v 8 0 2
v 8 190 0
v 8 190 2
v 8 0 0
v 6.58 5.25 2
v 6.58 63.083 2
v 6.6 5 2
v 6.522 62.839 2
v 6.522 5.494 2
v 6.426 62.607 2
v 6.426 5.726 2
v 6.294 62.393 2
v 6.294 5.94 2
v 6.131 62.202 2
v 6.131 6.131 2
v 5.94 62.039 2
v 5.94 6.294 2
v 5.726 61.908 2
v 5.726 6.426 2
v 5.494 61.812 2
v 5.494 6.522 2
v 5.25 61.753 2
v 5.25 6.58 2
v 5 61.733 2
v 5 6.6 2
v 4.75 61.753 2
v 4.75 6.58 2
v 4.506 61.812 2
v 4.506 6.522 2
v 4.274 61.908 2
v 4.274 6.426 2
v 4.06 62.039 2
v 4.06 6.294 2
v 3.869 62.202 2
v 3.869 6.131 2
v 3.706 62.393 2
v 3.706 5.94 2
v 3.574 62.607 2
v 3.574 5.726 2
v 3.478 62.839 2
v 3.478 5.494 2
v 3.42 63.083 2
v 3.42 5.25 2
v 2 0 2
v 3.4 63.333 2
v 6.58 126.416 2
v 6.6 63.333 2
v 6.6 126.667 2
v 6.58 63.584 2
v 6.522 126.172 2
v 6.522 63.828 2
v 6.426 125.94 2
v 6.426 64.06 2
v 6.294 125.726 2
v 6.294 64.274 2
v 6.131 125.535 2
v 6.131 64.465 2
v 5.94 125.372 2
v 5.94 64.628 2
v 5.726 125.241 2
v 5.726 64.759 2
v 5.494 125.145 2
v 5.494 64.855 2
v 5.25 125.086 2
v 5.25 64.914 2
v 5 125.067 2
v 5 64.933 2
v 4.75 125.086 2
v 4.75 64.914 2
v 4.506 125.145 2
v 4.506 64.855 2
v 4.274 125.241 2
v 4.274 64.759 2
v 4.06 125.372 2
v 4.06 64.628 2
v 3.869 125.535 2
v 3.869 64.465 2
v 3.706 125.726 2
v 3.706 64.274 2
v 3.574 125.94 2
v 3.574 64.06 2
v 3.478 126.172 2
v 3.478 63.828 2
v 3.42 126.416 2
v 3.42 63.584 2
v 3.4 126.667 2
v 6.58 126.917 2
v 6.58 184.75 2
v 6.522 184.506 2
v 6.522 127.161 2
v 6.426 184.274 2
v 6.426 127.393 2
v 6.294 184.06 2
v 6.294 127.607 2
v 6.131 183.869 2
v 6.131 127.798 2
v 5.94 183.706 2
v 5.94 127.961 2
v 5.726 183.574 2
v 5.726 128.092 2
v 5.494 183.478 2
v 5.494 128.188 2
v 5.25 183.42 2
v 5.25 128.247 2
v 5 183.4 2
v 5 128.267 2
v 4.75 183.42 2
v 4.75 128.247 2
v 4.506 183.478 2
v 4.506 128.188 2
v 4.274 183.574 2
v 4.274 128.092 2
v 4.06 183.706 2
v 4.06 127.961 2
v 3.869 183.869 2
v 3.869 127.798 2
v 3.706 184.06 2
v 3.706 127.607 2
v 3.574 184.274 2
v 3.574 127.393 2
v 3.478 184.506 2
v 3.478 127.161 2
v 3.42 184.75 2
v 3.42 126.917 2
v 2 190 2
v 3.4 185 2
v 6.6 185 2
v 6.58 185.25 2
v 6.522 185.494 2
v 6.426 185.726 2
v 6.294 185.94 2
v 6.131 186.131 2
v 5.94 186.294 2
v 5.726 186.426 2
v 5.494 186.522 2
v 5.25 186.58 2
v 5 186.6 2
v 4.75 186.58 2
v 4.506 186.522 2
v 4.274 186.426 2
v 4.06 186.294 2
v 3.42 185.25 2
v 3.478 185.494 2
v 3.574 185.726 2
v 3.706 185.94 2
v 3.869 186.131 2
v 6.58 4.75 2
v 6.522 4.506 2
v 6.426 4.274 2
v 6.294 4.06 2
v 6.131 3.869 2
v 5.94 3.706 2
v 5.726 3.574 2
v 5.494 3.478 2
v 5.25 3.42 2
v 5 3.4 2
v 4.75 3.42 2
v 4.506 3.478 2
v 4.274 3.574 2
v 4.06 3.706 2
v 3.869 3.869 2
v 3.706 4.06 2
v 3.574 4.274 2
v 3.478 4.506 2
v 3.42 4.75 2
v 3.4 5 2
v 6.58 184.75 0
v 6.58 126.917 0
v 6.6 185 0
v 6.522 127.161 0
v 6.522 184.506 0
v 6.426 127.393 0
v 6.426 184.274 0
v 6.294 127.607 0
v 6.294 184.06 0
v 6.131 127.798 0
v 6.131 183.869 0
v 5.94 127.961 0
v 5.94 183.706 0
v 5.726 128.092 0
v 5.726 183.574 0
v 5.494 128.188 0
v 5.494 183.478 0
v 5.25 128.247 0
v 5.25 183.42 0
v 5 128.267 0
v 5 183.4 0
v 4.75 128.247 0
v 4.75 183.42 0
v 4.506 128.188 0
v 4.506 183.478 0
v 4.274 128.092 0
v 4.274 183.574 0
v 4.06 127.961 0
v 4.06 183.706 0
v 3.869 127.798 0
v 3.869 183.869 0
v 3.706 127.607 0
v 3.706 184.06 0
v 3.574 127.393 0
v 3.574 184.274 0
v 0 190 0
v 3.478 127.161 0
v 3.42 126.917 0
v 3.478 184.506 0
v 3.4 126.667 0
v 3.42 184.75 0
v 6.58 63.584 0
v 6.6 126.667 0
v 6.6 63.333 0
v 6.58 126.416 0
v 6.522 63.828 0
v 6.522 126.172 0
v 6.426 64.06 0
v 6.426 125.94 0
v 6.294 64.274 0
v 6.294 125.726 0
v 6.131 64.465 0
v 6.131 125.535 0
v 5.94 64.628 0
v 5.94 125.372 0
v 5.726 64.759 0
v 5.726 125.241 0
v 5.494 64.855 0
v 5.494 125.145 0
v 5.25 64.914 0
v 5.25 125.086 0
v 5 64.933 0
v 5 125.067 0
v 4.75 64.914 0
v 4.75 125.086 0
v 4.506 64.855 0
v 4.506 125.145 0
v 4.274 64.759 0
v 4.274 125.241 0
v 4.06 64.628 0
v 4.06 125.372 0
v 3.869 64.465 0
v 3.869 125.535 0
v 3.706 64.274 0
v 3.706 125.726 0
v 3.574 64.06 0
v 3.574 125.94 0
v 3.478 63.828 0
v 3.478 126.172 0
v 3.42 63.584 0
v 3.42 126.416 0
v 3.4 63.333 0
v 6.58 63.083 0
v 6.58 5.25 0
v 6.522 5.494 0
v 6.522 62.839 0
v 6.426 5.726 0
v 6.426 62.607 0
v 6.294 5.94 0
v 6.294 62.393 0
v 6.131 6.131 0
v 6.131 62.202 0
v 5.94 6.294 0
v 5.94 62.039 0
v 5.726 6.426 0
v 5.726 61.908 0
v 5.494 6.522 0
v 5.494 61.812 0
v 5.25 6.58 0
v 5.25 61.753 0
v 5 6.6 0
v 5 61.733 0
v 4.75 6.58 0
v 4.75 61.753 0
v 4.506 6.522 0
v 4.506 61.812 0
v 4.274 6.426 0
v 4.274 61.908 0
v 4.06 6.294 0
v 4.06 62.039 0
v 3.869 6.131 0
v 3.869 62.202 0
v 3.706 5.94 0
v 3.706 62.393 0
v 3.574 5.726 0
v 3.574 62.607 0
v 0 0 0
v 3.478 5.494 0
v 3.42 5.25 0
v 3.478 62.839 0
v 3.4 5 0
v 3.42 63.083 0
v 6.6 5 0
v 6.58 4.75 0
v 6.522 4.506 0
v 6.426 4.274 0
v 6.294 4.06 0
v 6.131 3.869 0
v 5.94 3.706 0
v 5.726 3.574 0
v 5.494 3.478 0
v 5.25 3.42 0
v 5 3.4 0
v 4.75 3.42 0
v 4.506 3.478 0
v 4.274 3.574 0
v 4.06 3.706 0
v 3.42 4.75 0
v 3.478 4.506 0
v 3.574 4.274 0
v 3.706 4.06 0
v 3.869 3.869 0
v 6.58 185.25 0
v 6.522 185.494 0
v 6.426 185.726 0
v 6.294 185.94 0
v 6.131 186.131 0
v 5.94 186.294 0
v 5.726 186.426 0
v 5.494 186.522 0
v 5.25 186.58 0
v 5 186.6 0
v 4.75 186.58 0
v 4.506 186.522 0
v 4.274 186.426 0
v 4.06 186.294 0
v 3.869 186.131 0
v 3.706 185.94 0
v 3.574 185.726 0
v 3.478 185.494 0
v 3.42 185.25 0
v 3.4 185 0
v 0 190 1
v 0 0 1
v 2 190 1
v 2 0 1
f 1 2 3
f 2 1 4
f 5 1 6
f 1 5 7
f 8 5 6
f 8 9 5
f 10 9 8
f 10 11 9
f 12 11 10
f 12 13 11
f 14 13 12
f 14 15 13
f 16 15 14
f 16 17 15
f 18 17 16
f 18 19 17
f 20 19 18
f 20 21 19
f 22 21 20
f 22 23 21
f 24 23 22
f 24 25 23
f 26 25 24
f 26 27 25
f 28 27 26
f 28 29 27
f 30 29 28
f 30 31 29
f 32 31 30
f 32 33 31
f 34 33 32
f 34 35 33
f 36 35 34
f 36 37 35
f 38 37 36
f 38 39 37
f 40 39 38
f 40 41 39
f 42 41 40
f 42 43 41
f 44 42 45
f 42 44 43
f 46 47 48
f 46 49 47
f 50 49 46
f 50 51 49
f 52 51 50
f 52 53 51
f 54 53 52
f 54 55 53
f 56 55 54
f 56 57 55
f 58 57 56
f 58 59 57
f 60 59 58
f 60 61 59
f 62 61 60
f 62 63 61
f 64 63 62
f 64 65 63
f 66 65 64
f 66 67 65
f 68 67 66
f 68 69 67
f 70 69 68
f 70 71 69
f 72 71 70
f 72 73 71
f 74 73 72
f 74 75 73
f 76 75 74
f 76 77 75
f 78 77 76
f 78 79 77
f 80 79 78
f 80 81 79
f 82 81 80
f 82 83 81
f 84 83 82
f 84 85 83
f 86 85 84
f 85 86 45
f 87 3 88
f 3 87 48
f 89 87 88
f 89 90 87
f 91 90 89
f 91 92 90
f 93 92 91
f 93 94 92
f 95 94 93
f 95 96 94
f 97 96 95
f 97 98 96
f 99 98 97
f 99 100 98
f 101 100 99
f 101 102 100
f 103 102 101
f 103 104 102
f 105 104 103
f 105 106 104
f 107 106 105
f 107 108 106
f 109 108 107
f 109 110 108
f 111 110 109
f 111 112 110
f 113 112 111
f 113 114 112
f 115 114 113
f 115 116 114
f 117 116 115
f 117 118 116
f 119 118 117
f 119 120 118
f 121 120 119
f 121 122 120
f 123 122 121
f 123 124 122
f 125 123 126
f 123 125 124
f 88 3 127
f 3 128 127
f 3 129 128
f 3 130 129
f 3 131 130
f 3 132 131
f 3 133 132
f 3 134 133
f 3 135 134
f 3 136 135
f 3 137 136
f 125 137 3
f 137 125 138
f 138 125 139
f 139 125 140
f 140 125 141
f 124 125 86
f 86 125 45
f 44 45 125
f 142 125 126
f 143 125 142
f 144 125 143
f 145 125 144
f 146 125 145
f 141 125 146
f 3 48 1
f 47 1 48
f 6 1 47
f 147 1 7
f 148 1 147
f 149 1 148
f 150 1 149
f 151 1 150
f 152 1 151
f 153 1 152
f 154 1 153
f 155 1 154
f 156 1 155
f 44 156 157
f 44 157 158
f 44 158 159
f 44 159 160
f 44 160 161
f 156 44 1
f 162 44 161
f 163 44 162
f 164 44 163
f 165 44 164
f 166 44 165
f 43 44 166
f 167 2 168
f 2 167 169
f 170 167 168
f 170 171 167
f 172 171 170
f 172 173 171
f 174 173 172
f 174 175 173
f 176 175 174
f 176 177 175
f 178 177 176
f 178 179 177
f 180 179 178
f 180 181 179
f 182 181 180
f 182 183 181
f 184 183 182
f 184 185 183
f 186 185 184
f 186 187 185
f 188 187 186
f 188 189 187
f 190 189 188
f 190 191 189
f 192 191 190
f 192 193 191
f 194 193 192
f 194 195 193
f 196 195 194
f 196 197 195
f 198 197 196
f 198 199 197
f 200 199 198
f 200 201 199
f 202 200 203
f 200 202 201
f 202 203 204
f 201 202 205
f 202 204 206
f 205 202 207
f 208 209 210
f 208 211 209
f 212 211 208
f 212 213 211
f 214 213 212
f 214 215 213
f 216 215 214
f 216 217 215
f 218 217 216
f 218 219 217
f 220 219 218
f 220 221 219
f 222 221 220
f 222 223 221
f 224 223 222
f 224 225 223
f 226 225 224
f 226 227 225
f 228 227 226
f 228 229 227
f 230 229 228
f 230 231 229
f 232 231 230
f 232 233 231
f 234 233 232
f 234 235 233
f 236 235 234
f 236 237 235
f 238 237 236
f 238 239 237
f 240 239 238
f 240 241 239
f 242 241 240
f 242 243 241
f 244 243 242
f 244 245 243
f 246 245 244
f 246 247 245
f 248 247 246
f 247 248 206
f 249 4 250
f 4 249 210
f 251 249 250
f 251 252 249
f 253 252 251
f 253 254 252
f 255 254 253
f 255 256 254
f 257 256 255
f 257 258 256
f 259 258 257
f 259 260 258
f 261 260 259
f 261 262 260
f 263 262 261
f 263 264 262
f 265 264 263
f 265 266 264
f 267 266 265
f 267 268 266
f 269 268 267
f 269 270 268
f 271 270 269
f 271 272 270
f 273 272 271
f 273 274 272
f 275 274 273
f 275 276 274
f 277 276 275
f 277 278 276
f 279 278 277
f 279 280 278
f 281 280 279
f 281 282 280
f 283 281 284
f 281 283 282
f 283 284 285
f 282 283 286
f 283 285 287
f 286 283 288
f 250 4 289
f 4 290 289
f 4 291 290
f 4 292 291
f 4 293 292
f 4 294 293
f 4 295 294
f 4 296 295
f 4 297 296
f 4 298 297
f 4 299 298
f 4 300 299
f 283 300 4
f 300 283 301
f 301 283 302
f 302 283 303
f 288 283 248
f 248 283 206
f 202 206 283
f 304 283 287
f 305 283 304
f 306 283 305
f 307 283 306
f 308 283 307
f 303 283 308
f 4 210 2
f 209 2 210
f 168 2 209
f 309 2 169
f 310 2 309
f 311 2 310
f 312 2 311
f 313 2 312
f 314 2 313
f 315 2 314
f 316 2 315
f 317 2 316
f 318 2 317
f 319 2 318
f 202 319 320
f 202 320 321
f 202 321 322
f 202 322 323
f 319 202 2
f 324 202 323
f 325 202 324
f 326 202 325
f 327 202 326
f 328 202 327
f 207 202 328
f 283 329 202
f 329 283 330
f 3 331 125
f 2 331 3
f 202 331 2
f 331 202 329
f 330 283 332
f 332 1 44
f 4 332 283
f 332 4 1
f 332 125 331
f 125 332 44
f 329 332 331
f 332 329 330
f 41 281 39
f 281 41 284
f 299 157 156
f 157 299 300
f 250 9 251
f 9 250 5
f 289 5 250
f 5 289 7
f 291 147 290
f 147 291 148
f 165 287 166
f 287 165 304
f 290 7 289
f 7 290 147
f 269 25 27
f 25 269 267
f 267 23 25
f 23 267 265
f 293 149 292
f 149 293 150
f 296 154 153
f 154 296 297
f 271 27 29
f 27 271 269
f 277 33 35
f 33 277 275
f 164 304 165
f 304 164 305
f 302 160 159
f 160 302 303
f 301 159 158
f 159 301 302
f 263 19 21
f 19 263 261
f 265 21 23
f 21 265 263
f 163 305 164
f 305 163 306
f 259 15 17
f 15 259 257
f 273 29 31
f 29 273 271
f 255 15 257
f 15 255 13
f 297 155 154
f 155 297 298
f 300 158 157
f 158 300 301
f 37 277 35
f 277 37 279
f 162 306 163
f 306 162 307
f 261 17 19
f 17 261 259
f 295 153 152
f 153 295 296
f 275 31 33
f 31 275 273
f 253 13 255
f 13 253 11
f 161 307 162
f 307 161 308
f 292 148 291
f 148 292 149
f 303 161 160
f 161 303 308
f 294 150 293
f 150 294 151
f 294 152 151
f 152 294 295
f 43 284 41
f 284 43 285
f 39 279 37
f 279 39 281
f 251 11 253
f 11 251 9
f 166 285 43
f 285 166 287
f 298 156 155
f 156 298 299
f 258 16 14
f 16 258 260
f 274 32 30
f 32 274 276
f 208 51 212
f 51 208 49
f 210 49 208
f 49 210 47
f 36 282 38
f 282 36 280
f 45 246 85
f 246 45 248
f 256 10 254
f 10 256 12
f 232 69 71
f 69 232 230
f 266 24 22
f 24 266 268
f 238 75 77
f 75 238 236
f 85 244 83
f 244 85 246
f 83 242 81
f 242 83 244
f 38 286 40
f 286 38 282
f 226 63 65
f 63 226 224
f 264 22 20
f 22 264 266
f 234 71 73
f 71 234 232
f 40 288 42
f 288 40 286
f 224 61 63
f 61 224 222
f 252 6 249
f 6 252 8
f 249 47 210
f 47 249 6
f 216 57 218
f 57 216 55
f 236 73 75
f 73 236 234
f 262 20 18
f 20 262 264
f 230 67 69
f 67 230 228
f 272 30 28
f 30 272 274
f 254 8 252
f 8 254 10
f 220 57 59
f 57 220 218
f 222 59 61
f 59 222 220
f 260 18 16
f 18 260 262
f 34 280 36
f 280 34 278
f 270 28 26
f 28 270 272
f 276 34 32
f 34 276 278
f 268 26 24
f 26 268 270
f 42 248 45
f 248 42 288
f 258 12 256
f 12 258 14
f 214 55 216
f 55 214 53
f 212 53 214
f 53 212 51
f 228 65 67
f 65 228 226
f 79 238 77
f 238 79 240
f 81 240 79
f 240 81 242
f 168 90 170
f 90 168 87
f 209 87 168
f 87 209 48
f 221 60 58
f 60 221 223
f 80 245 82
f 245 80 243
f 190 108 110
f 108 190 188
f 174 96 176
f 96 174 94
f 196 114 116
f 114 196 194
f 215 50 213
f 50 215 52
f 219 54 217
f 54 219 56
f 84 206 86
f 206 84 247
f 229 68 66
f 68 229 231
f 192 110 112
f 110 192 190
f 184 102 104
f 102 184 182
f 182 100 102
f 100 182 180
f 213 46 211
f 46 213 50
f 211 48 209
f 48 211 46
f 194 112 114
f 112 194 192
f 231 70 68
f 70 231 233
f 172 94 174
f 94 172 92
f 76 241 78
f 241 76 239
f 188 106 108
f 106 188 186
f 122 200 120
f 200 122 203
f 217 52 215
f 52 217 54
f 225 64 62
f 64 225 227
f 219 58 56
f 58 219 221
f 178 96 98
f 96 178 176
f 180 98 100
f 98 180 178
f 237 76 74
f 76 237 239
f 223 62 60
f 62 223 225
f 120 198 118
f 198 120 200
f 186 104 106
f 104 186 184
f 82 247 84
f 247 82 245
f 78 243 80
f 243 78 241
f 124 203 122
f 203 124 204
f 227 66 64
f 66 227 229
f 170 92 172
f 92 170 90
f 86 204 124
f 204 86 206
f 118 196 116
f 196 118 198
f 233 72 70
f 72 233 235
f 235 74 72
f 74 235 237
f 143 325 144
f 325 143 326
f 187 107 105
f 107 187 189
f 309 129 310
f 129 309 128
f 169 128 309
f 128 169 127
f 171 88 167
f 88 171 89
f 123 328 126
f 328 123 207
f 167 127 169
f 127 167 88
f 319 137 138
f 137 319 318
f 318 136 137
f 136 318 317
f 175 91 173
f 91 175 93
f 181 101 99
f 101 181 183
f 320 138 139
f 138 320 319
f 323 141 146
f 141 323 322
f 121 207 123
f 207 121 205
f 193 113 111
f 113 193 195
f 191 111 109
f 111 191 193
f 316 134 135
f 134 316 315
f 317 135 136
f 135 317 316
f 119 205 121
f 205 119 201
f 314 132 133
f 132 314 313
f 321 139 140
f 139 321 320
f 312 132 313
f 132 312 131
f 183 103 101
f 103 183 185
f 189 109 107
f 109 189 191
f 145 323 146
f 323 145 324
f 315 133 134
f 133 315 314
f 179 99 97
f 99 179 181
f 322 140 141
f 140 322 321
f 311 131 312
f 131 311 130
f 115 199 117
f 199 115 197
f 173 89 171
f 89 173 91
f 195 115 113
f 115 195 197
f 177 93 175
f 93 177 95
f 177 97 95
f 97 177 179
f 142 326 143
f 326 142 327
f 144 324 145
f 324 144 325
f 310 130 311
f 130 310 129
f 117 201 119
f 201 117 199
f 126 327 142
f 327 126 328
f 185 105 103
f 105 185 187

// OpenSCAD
// Designed by Stanley <stanoba@gmail.com>
// SMD Feeder Rail <smd_feeder_rail.scad>
// Version: 0.1
// Creative Commons - Attribution license
// https://www.thingiverse.com/stanoba/about
// SMD feeder rail for SMD feeders https://www.thingiverse.com/thing:2414955

length=190; // length in mm

difference(){
	cube([8,length,2]);
	translate([0,0,1]) cube([2,length,1]);
	translate([5,5,0]) cylinder(h=15, d=3.2, $fn=40);
	translate([5,length/3,0]) cylinder(h=15, d=3.2, $fn=40);
	translate([5,(length/3)*2,0]) cylinder(h=15, d=3.2, $fn=40);
	translate([5,length-5,0]) cylinder(h=15, d=3.2, $fn=40);
}
